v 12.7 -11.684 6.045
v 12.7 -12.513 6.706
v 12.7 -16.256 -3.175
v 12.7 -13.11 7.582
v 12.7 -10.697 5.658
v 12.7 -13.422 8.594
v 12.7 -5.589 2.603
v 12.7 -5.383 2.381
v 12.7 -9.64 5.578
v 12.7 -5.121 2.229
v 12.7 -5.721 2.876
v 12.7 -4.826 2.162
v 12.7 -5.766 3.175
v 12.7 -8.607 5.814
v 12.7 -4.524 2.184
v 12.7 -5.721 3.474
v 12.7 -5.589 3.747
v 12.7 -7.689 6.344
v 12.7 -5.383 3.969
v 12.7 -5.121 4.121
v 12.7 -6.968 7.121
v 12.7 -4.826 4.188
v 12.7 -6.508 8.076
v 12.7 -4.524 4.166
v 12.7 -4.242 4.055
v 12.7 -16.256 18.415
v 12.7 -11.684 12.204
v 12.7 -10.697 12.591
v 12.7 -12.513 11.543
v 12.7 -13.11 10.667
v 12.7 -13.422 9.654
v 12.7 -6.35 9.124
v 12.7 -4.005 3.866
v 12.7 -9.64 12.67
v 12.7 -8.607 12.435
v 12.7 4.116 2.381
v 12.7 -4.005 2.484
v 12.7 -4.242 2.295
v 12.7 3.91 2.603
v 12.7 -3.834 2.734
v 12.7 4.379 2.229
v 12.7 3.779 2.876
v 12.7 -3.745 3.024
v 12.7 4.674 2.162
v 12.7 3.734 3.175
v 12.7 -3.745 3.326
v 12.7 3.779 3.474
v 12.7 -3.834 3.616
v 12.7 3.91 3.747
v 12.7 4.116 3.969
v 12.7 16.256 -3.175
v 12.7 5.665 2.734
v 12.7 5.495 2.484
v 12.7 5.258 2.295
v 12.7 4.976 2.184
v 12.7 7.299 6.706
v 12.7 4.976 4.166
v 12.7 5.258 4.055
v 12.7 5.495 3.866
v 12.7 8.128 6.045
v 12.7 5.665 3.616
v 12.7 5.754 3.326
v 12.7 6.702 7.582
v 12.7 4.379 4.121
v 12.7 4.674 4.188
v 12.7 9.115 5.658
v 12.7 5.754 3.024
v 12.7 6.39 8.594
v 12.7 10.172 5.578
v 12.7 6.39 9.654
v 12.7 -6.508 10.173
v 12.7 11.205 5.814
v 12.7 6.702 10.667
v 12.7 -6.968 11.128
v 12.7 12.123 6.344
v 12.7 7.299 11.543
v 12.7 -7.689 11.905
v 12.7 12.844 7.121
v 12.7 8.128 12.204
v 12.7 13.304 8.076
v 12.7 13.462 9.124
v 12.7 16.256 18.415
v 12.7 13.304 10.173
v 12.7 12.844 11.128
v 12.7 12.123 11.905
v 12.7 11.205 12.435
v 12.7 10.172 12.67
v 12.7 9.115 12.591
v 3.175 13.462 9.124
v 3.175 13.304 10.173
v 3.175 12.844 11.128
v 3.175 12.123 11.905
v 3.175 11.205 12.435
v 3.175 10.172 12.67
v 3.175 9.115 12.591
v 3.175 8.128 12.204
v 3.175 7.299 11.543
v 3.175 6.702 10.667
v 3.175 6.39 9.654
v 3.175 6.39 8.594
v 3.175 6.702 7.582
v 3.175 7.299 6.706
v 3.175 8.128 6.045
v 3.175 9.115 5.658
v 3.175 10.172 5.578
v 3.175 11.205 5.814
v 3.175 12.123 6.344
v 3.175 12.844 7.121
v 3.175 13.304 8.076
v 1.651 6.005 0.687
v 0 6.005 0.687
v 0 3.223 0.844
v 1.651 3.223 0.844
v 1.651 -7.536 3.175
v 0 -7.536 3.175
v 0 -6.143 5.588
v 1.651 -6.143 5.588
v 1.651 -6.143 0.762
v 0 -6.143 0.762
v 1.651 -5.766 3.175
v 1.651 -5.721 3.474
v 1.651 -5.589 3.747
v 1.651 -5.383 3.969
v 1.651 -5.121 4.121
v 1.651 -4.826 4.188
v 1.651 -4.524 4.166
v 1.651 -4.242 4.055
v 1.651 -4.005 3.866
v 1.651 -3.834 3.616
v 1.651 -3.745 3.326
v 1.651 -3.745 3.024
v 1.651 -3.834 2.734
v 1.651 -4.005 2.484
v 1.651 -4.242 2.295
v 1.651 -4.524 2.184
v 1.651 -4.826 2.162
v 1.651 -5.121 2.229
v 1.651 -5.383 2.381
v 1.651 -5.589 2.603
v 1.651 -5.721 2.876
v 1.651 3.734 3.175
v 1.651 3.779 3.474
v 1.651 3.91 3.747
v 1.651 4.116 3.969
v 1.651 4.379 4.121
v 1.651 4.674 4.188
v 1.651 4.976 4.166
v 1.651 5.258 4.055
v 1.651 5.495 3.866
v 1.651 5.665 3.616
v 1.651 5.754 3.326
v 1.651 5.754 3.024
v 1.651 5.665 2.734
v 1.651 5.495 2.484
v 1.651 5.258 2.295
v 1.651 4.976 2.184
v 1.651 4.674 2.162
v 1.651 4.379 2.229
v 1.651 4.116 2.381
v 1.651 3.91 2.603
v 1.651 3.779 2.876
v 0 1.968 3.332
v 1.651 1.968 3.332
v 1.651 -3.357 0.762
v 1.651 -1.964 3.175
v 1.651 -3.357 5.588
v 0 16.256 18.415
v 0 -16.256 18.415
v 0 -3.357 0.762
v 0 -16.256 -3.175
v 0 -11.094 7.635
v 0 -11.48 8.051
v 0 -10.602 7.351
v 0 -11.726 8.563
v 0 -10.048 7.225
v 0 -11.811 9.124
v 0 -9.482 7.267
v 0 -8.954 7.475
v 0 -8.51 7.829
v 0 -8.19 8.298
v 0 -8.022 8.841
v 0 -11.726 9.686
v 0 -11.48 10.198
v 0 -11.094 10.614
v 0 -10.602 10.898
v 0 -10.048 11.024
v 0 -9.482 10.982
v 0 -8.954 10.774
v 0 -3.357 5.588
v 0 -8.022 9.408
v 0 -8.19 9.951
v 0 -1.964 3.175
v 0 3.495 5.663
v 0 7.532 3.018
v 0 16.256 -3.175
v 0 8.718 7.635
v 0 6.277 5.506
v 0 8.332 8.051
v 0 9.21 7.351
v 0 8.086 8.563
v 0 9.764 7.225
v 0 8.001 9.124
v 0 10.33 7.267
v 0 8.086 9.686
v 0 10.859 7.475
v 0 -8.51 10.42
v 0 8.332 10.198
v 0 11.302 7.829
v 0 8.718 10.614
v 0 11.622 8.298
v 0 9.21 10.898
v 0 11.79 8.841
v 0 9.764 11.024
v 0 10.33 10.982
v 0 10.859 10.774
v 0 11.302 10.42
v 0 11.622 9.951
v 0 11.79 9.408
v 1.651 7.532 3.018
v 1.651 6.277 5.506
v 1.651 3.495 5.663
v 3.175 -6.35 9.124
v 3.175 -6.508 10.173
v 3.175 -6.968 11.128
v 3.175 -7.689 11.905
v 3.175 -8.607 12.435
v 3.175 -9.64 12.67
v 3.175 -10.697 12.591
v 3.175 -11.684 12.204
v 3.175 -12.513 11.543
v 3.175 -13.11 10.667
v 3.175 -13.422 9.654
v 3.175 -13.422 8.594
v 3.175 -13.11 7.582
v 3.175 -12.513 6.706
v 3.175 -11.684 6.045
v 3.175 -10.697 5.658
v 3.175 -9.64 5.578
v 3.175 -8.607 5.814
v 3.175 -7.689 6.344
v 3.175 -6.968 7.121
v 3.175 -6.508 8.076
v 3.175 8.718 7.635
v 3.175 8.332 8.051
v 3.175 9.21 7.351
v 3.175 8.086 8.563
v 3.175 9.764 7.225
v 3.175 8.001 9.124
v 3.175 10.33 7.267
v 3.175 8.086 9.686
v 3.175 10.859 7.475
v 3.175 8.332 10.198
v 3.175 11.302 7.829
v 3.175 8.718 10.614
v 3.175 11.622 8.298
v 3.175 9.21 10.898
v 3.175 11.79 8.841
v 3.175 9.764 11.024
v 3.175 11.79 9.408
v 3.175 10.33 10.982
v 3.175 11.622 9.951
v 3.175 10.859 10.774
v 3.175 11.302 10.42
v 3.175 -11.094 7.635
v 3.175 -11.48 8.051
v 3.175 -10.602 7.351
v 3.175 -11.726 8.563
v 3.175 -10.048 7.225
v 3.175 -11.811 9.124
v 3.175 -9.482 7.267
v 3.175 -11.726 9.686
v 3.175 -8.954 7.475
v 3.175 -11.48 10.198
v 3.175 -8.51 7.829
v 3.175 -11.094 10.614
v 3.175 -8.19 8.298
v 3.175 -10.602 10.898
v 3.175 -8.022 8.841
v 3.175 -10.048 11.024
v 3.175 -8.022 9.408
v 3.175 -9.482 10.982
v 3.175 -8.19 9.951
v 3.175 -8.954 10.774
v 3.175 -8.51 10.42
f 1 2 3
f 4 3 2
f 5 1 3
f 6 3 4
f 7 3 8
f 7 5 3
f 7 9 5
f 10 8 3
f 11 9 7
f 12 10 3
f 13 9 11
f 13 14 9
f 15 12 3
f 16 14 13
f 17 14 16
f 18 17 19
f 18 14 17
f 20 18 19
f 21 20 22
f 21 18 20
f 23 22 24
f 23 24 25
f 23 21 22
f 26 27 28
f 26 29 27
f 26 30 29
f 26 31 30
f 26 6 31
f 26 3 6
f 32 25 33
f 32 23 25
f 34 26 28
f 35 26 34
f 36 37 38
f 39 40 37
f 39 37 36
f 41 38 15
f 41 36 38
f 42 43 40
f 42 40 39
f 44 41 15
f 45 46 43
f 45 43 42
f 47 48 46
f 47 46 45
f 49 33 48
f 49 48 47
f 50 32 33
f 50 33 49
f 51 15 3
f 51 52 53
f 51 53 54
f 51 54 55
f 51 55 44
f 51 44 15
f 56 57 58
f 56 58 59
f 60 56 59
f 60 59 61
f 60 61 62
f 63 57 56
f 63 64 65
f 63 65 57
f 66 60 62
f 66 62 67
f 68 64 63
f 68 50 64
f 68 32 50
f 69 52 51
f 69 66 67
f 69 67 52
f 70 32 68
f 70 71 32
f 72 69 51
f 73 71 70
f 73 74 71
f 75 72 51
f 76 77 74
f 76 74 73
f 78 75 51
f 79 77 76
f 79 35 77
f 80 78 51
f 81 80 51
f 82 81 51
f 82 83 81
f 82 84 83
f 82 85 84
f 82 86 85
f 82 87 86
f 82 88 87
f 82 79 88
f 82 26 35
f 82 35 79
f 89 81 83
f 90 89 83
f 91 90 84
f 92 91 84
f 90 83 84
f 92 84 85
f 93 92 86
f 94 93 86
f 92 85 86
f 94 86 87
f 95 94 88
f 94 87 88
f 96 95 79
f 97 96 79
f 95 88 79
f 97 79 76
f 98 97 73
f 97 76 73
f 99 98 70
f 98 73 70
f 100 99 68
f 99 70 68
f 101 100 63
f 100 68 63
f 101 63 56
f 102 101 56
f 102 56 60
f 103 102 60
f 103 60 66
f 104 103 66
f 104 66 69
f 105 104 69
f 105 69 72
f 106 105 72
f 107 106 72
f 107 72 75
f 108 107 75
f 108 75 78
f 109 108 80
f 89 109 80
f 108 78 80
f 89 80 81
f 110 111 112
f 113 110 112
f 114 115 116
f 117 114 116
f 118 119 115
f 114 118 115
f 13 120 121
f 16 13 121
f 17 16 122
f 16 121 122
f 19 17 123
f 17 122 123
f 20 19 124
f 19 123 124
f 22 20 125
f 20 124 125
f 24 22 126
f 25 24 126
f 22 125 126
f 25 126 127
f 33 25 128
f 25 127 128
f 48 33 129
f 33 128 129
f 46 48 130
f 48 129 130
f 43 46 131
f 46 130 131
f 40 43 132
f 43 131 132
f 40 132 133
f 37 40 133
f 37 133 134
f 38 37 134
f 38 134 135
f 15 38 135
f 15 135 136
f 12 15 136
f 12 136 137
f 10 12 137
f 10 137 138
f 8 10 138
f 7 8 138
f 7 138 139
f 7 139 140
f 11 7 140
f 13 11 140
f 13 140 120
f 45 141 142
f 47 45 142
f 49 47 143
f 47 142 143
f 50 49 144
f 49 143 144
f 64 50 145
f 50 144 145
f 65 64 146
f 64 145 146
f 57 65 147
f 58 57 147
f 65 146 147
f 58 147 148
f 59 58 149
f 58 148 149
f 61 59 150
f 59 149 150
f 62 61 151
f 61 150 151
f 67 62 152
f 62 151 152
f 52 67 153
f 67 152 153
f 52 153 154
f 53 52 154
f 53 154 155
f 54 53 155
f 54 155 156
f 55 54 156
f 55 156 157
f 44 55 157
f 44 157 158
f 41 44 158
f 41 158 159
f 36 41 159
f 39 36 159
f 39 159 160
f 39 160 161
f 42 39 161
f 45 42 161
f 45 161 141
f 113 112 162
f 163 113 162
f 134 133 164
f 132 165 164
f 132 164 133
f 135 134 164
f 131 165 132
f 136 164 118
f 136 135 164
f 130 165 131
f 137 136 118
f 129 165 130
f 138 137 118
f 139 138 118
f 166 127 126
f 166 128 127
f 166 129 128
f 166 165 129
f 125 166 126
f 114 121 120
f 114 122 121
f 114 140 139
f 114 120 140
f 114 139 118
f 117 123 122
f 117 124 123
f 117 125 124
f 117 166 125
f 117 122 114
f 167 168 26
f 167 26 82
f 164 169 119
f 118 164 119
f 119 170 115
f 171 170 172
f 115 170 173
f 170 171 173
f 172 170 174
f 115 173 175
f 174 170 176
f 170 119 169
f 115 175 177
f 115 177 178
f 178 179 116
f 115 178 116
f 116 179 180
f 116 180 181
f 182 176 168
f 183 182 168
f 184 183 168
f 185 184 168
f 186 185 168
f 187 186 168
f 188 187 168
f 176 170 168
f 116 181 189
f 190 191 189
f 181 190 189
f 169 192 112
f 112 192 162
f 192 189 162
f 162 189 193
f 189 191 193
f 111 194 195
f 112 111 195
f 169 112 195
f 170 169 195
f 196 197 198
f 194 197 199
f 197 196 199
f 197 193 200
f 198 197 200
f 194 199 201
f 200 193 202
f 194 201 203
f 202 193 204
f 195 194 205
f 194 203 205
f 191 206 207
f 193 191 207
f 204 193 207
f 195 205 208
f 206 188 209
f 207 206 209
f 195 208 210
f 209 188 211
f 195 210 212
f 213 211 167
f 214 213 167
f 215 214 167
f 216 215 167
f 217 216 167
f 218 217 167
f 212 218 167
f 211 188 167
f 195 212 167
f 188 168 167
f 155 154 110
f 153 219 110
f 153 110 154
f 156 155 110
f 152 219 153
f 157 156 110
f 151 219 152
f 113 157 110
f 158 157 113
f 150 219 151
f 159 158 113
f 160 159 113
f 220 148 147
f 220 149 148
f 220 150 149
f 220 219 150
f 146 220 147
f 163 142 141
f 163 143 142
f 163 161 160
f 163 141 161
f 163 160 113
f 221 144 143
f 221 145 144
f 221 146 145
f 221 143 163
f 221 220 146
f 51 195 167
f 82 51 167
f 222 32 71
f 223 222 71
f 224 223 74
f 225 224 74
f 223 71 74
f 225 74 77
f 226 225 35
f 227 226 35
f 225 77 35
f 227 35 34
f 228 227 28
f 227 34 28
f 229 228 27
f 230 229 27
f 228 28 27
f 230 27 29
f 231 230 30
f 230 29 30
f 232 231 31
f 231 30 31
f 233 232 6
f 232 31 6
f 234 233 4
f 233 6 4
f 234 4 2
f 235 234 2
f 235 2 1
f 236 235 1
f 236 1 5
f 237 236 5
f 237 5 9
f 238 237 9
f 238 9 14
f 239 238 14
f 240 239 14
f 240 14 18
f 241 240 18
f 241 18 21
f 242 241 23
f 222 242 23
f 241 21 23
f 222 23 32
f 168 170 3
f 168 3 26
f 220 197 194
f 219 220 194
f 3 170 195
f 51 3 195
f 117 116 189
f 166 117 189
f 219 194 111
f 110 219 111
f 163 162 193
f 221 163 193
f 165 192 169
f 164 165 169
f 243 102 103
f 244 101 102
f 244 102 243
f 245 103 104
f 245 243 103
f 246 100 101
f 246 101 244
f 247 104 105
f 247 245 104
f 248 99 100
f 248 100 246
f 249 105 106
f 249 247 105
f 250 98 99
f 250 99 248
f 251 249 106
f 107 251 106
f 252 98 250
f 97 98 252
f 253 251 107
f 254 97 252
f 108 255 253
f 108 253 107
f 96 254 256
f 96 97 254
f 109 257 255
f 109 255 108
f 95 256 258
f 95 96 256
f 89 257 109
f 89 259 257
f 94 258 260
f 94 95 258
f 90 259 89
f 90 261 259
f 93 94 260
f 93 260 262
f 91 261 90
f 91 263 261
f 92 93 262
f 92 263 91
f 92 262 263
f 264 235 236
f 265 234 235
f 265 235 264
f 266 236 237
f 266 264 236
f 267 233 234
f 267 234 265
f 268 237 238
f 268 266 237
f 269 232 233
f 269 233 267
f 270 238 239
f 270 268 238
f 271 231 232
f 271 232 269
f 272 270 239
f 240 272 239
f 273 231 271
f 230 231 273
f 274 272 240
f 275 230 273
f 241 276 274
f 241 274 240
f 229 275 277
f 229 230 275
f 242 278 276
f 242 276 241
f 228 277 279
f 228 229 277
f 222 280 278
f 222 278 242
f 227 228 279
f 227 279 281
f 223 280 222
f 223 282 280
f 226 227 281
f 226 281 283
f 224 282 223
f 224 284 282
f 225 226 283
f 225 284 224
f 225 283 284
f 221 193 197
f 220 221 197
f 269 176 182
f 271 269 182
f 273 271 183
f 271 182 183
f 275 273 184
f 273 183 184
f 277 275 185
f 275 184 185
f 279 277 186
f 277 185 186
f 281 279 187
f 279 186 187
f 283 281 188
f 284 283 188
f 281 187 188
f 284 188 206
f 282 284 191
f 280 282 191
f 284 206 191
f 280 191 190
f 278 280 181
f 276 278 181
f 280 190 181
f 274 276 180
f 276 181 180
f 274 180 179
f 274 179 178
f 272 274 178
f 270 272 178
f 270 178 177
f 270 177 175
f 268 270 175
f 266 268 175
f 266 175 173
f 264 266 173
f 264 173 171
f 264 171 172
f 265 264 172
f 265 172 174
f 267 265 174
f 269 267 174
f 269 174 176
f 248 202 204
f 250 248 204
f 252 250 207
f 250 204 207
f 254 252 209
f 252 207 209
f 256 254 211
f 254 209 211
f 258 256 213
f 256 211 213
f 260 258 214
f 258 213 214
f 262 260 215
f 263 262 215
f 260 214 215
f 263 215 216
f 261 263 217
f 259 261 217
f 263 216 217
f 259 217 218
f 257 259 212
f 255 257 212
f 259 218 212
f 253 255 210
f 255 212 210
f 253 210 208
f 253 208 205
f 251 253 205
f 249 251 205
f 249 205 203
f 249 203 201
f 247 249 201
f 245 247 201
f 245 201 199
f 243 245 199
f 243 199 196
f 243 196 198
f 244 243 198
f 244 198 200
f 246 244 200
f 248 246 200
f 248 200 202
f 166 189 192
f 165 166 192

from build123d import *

# Parameters (mm, degrees)
F0_W     = 32.512
F0_H     = 21.59
F1_DEPTH = 12.7
F2_R     = 1.016
F2_R_2   = 1.905
F3_DEPTH = 12.701
F5_DEPTH = 1.651
F6_R     = 3.556
F7_DEPTH = 9.525


with BuildPart() as f1:
    # F0 (on Right) → F1 (new body)
    with BuildSketch(Plane.YZ):
        with Locations((0, 7.62)):
            Rectangle(F0_W, F0_H)
    extrude(amount=F1_DEPTH)

    # F2 (on face) → F3 (cut, through all)
    with BuildSketch(Plane(origin=(0, 0, 0), x_dir=(0, -1, 0), z_dir=(-1, 0, 0))):
        with Locations((4.7498, 3.175)):
            Circle(F2_R)
        with Locations((-4.7498, 3.175)):
            Circle(F2_R)
        with Locations((-9.906, 9.124435)):
            Circle(F2_R_2)
        with Locations((9.906, 9.124435)):
            Circle(F2_R_2)
    extrude(amount=-F3_DEPTH, mode=Mode.SUBTRACT)

    # F4 (on face) → F5 (cut)
    with BuildSketch(Plane(origin=(0, 0, 0), x_dir=(0, -1, 0), z_dir=(-1, 0, 0))):
        Polygon((-1.96794, 3.332093), (-3.494916, 5.662708), (-6.276777, 5.505615), (-7.53166, 3.017907), (-6.004684, 0.687292), (-3.222823, 0.844385), align=None)
        Polygon((6.142946, 5.588), (3.356654, 5.588), (1.963508, 3.175), (3.356654, 0.762), (6.142946, 0.762), (7.536092, 3.175), align=None)
    extrude(amount=-F5_DEPTH, mode=Mode.SUBTRACT)

    # F6 (on face) → F7 (cut)
    with BuildSketch(Plane.YZ.offset(12.7)):
        with Locations((9.906, 9.124435)):
            Circle(F6_R)
        with Locations((-9.906, 9.124435)):
            Circle(F6_R)
    extrude(amount=-F7_DEPTH, mode=Mode.SUBTRACT)


solid = f1.part
